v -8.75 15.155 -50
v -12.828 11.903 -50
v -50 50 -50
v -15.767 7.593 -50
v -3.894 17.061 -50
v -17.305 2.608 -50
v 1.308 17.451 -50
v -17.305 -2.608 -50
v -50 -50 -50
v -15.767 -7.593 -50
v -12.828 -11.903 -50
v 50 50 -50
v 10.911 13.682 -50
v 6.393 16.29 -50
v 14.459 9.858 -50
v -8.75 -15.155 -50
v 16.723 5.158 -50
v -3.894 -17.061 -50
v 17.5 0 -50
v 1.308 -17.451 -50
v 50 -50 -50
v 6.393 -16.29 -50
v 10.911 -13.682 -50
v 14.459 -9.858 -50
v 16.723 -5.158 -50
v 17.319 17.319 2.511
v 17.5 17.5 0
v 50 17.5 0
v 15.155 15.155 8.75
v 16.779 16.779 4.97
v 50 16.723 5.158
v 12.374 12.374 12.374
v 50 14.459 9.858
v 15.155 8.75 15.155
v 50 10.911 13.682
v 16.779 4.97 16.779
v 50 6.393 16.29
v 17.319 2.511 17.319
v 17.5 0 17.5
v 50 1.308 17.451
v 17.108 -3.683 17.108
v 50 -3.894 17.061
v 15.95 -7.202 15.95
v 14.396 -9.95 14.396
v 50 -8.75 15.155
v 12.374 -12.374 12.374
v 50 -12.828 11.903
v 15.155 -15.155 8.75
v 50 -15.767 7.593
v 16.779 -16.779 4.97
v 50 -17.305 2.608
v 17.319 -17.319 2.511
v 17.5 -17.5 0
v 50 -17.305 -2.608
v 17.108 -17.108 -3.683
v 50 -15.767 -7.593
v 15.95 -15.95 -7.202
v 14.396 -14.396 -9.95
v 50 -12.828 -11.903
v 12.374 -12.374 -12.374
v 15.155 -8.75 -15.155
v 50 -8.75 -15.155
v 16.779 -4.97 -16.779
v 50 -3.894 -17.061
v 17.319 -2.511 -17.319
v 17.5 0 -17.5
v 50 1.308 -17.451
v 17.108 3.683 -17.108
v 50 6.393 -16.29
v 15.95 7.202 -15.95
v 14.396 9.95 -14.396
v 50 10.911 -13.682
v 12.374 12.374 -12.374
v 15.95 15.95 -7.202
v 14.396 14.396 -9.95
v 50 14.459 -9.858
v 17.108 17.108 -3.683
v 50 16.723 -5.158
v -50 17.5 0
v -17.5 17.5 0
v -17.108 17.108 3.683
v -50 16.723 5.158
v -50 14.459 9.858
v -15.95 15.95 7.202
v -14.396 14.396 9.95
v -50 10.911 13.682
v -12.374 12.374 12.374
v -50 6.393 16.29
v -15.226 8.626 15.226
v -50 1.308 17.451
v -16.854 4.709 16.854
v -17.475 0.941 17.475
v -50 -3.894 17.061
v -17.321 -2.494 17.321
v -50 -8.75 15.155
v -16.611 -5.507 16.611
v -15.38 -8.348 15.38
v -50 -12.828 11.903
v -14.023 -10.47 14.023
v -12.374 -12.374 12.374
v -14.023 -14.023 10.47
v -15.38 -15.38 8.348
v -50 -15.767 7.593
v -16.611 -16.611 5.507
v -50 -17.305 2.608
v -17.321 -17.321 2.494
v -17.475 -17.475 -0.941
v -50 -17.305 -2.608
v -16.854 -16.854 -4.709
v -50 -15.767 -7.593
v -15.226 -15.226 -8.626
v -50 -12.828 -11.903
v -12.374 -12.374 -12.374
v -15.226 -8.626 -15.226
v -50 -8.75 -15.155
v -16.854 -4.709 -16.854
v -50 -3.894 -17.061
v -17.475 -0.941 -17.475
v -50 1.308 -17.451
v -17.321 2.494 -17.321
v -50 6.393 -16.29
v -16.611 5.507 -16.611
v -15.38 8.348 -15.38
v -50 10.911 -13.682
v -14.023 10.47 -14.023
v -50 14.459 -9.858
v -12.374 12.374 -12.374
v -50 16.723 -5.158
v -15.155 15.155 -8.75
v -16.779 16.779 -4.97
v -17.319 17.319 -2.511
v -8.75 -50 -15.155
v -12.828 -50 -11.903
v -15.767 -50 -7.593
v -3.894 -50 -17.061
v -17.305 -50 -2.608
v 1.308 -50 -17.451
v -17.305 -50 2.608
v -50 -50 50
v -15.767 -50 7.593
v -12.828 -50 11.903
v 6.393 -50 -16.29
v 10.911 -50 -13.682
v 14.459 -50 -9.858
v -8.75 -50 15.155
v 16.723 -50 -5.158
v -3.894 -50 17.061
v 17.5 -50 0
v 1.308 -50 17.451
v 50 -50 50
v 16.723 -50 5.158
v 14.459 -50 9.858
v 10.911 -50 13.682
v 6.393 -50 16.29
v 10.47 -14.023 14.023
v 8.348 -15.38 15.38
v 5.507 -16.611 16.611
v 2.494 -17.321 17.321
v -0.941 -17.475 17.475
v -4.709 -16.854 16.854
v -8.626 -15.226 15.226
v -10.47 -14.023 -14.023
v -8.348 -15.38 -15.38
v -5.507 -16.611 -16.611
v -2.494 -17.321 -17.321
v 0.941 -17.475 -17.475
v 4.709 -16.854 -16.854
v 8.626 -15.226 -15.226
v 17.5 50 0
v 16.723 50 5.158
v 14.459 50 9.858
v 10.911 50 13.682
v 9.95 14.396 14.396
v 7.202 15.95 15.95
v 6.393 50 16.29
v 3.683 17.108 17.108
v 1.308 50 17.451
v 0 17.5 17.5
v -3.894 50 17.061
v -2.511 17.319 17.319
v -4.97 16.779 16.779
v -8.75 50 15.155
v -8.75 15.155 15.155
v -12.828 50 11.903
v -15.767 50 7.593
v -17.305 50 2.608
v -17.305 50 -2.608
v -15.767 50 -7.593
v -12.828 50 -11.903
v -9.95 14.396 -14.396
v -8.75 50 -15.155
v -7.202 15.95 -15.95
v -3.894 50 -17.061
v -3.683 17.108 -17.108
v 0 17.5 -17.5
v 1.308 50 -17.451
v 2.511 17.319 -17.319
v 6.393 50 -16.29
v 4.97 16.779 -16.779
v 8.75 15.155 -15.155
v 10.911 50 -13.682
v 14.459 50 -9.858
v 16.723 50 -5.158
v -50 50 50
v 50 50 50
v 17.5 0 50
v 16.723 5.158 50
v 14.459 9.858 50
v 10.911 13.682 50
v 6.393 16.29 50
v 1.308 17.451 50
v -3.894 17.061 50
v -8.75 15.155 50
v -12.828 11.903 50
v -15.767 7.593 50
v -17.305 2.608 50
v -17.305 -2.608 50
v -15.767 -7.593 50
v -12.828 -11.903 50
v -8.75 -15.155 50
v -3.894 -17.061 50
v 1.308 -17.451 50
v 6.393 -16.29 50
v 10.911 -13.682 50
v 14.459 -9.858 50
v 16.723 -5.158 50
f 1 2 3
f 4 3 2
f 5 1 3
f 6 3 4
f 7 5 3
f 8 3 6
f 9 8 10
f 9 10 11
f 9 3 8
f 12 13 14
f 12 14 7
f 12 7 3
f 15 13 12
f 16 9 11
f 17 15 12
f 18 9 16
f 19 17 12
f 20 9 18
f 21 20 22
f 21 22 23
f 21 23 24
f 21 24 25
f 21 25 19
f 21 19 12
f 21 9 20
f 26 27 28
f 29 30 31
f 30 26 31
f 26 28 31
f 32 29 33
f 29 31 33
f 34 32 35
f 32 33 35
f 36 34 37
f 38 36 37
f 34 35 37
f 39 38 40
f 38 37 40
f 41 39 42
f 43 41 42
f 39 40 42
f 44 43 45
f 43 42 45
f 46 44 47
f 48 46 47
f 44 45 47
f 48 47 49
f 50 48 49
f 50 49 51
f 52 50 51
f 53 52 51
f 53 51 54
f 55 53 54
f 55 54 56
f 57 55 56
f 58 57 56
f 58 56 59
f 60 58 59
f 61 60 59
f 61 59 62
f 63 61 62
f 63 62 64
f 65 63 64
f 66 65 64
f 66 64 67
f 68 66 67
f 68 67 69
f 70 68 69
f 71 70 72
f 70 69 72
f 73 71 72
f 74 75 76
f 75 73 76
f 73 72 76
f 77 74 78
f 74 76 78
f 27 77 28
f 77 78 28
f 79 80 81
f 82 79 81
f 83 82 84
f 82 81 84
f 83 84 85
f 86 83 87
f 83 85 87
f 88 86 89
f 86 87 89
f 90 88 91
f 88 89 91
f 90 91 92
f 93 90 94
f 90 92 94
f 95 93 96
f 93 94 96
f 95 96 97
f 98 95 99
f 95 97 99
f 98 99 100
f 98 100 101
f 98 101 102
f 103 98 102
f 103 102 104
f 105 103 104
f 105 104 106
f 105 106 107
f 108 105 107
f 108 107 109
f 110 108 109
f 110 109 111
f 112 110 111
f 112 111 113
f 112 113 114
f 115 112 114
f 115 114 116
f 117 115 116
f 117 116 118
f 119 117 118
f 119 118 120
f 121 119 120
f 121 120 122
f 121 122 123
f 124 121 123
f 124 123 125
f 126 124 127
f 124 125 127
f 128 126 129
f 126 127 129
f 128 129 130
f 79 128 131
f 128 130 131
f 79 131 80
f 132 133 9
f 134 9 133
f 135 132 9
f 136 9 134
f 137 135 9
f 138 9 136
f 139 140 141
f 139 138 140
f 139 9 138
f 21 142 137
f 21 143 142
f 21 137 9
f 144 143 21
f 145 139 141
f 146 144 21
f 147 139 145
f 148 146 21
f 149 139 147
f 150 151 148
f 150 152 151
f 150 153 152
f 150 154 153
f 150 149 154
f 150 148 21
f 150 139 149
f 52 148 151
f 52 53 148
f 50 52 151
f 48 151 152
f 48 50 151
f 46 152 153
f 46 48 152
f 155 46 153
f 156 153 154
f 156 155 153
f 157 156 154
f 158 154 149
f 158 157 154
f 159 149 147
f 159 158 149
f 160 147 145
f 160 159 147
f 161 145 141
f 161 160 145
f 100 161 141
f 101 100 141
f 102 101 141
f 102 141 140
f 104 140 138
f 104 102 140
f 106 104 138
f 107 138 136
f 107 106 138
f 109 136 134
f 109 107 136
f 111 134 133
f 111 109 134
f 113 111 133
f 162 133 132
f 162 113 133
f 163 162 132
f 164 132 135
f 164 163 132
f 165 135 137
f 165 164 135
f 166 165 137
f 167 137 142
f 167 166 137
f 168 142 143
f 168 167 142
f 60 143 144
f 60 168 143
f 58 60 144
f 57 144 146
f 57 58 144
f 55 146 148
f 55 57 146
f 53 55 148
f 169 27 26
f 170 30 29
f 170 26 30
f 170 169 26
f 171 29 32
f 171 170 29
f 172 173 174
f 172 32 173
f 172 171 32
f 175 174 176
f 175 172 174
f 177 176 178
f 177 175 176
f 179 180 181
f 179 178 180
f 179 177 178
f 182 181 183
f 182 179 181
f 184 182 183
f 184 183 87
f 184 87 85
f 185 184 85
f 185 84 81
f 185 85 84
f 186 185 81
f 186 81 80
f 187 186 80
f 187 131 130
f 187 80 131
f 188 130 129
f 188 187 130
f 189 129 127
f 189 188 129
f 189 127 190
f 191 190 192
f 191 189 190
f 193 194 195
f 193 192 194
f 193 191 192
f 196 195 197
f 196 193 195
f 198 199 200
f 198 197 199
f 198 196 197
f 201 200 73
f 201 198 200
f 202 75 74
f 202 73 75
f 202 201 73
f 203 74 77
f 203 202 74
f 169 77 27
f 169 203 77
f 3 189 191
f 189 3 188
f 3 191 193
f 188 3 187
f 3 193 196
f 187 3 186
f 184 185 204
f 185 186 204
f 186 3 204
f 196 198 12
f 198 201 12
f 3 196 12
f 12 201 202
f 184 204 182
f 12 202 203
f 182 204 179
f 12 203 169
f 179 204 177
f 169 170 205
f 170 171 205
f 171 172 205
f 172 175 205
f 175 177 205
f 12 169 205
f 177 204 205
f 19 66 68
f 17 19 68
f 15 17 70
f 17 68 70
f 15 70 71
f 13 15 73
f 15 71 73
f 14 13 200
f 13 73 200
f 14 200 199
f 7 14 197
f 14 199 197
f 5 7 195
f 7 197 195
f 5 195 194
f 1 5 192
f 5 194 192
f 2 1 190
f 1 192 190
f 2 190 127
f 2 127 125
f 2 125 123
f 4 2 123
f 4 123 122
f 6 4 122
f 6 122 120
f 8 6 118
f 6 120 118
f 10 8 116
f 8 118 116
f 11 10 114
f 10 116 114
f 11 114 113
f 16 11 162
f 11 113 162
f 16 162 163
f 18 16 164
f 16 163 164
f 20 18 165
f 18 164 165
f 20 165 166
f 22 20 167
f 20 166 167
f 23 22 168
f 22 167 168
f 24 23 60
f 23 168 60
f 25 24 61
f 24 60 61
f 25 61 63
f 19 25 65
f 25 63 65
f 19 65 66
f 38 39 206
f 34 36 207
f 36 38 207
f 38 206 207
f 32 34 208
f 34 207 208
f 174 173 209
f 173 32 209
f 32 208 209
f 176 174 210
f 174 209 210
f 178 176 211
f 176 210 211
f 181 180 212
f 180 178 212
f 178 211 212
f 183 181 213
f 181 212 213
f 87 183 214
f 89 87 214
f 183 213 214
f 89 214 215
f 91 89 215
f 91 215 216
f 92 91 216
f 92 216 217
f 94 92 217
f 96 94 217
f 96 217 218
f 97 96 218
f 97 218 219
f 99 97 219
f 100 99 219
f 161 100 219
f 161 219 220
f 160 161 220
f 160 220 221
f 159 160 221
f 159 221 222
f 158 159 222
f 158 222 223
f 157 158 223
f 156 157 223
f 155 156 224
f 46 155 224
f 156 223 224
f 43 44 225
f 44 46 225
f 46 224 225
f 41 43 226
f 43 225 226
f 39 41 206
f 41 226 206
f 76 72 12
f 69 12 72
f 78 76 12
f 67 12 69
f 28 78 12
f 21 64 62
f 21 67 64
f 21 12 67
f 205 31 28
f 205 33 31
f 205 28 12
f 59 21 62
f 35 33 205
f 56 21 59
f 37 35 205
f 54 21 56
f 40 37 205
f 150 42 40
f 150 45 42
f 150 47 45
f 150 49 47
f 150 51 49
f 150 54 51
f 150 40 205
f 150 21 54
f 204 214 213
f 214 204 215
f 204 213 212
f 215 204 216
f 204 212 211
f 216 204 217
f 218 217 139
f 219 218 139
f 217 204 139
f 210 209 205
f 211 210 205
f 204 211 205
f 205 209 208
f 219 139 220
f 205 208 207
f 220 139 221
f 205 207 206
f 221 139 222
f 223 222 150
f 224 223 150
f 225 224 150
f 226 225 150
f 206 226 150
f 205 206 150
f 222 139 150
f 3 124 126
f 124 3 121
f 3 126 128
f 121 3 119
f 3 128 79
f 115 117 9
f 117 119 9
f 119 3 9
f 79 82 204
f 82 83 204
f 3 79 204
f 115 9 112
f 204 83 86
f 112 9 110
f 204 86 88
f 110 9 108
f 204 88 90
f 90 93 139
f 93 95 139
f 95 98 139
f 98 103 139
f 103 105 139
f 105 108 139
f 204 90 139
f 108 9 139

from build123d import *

# Parameters (mm, degrees)
F0_W     = 100
F0_H     = 100
F0_R     = 17.5
F1_DEPTH = 50
F2_R     = 17.5
F3_DEPTH = 100
F4_R     = 17.5
F5_DEPTH = 100


with BuildPart() as f1:
    # F0 (on Front) → F1 (new body, symmetric)
    with BuildSketch(Plane.XZ):
        Rectangle(F0_W, F0_H)
        Circle(F0_R, mode=Mode.SUBTRACT)
    extrude(amount=F1_DEPTH, both=True)

    # F2 (on face) → F3 (cut, through all)
    with BuildSketch(Plane.YZ.offset(50)):
        Circle(F2_R)
    extrude(amount=-F3_DEPTH, mode=Mode.SUBTRACT)

    # F4 (on face) → F5 (cut, through all)
    with BuildSketch(Plane.XY.offset(50)):
        Circle(F4_R)
    extrude(amount=-F5_DEPTH, mode=Mode.SUBTRACT)


solid = f1.part
